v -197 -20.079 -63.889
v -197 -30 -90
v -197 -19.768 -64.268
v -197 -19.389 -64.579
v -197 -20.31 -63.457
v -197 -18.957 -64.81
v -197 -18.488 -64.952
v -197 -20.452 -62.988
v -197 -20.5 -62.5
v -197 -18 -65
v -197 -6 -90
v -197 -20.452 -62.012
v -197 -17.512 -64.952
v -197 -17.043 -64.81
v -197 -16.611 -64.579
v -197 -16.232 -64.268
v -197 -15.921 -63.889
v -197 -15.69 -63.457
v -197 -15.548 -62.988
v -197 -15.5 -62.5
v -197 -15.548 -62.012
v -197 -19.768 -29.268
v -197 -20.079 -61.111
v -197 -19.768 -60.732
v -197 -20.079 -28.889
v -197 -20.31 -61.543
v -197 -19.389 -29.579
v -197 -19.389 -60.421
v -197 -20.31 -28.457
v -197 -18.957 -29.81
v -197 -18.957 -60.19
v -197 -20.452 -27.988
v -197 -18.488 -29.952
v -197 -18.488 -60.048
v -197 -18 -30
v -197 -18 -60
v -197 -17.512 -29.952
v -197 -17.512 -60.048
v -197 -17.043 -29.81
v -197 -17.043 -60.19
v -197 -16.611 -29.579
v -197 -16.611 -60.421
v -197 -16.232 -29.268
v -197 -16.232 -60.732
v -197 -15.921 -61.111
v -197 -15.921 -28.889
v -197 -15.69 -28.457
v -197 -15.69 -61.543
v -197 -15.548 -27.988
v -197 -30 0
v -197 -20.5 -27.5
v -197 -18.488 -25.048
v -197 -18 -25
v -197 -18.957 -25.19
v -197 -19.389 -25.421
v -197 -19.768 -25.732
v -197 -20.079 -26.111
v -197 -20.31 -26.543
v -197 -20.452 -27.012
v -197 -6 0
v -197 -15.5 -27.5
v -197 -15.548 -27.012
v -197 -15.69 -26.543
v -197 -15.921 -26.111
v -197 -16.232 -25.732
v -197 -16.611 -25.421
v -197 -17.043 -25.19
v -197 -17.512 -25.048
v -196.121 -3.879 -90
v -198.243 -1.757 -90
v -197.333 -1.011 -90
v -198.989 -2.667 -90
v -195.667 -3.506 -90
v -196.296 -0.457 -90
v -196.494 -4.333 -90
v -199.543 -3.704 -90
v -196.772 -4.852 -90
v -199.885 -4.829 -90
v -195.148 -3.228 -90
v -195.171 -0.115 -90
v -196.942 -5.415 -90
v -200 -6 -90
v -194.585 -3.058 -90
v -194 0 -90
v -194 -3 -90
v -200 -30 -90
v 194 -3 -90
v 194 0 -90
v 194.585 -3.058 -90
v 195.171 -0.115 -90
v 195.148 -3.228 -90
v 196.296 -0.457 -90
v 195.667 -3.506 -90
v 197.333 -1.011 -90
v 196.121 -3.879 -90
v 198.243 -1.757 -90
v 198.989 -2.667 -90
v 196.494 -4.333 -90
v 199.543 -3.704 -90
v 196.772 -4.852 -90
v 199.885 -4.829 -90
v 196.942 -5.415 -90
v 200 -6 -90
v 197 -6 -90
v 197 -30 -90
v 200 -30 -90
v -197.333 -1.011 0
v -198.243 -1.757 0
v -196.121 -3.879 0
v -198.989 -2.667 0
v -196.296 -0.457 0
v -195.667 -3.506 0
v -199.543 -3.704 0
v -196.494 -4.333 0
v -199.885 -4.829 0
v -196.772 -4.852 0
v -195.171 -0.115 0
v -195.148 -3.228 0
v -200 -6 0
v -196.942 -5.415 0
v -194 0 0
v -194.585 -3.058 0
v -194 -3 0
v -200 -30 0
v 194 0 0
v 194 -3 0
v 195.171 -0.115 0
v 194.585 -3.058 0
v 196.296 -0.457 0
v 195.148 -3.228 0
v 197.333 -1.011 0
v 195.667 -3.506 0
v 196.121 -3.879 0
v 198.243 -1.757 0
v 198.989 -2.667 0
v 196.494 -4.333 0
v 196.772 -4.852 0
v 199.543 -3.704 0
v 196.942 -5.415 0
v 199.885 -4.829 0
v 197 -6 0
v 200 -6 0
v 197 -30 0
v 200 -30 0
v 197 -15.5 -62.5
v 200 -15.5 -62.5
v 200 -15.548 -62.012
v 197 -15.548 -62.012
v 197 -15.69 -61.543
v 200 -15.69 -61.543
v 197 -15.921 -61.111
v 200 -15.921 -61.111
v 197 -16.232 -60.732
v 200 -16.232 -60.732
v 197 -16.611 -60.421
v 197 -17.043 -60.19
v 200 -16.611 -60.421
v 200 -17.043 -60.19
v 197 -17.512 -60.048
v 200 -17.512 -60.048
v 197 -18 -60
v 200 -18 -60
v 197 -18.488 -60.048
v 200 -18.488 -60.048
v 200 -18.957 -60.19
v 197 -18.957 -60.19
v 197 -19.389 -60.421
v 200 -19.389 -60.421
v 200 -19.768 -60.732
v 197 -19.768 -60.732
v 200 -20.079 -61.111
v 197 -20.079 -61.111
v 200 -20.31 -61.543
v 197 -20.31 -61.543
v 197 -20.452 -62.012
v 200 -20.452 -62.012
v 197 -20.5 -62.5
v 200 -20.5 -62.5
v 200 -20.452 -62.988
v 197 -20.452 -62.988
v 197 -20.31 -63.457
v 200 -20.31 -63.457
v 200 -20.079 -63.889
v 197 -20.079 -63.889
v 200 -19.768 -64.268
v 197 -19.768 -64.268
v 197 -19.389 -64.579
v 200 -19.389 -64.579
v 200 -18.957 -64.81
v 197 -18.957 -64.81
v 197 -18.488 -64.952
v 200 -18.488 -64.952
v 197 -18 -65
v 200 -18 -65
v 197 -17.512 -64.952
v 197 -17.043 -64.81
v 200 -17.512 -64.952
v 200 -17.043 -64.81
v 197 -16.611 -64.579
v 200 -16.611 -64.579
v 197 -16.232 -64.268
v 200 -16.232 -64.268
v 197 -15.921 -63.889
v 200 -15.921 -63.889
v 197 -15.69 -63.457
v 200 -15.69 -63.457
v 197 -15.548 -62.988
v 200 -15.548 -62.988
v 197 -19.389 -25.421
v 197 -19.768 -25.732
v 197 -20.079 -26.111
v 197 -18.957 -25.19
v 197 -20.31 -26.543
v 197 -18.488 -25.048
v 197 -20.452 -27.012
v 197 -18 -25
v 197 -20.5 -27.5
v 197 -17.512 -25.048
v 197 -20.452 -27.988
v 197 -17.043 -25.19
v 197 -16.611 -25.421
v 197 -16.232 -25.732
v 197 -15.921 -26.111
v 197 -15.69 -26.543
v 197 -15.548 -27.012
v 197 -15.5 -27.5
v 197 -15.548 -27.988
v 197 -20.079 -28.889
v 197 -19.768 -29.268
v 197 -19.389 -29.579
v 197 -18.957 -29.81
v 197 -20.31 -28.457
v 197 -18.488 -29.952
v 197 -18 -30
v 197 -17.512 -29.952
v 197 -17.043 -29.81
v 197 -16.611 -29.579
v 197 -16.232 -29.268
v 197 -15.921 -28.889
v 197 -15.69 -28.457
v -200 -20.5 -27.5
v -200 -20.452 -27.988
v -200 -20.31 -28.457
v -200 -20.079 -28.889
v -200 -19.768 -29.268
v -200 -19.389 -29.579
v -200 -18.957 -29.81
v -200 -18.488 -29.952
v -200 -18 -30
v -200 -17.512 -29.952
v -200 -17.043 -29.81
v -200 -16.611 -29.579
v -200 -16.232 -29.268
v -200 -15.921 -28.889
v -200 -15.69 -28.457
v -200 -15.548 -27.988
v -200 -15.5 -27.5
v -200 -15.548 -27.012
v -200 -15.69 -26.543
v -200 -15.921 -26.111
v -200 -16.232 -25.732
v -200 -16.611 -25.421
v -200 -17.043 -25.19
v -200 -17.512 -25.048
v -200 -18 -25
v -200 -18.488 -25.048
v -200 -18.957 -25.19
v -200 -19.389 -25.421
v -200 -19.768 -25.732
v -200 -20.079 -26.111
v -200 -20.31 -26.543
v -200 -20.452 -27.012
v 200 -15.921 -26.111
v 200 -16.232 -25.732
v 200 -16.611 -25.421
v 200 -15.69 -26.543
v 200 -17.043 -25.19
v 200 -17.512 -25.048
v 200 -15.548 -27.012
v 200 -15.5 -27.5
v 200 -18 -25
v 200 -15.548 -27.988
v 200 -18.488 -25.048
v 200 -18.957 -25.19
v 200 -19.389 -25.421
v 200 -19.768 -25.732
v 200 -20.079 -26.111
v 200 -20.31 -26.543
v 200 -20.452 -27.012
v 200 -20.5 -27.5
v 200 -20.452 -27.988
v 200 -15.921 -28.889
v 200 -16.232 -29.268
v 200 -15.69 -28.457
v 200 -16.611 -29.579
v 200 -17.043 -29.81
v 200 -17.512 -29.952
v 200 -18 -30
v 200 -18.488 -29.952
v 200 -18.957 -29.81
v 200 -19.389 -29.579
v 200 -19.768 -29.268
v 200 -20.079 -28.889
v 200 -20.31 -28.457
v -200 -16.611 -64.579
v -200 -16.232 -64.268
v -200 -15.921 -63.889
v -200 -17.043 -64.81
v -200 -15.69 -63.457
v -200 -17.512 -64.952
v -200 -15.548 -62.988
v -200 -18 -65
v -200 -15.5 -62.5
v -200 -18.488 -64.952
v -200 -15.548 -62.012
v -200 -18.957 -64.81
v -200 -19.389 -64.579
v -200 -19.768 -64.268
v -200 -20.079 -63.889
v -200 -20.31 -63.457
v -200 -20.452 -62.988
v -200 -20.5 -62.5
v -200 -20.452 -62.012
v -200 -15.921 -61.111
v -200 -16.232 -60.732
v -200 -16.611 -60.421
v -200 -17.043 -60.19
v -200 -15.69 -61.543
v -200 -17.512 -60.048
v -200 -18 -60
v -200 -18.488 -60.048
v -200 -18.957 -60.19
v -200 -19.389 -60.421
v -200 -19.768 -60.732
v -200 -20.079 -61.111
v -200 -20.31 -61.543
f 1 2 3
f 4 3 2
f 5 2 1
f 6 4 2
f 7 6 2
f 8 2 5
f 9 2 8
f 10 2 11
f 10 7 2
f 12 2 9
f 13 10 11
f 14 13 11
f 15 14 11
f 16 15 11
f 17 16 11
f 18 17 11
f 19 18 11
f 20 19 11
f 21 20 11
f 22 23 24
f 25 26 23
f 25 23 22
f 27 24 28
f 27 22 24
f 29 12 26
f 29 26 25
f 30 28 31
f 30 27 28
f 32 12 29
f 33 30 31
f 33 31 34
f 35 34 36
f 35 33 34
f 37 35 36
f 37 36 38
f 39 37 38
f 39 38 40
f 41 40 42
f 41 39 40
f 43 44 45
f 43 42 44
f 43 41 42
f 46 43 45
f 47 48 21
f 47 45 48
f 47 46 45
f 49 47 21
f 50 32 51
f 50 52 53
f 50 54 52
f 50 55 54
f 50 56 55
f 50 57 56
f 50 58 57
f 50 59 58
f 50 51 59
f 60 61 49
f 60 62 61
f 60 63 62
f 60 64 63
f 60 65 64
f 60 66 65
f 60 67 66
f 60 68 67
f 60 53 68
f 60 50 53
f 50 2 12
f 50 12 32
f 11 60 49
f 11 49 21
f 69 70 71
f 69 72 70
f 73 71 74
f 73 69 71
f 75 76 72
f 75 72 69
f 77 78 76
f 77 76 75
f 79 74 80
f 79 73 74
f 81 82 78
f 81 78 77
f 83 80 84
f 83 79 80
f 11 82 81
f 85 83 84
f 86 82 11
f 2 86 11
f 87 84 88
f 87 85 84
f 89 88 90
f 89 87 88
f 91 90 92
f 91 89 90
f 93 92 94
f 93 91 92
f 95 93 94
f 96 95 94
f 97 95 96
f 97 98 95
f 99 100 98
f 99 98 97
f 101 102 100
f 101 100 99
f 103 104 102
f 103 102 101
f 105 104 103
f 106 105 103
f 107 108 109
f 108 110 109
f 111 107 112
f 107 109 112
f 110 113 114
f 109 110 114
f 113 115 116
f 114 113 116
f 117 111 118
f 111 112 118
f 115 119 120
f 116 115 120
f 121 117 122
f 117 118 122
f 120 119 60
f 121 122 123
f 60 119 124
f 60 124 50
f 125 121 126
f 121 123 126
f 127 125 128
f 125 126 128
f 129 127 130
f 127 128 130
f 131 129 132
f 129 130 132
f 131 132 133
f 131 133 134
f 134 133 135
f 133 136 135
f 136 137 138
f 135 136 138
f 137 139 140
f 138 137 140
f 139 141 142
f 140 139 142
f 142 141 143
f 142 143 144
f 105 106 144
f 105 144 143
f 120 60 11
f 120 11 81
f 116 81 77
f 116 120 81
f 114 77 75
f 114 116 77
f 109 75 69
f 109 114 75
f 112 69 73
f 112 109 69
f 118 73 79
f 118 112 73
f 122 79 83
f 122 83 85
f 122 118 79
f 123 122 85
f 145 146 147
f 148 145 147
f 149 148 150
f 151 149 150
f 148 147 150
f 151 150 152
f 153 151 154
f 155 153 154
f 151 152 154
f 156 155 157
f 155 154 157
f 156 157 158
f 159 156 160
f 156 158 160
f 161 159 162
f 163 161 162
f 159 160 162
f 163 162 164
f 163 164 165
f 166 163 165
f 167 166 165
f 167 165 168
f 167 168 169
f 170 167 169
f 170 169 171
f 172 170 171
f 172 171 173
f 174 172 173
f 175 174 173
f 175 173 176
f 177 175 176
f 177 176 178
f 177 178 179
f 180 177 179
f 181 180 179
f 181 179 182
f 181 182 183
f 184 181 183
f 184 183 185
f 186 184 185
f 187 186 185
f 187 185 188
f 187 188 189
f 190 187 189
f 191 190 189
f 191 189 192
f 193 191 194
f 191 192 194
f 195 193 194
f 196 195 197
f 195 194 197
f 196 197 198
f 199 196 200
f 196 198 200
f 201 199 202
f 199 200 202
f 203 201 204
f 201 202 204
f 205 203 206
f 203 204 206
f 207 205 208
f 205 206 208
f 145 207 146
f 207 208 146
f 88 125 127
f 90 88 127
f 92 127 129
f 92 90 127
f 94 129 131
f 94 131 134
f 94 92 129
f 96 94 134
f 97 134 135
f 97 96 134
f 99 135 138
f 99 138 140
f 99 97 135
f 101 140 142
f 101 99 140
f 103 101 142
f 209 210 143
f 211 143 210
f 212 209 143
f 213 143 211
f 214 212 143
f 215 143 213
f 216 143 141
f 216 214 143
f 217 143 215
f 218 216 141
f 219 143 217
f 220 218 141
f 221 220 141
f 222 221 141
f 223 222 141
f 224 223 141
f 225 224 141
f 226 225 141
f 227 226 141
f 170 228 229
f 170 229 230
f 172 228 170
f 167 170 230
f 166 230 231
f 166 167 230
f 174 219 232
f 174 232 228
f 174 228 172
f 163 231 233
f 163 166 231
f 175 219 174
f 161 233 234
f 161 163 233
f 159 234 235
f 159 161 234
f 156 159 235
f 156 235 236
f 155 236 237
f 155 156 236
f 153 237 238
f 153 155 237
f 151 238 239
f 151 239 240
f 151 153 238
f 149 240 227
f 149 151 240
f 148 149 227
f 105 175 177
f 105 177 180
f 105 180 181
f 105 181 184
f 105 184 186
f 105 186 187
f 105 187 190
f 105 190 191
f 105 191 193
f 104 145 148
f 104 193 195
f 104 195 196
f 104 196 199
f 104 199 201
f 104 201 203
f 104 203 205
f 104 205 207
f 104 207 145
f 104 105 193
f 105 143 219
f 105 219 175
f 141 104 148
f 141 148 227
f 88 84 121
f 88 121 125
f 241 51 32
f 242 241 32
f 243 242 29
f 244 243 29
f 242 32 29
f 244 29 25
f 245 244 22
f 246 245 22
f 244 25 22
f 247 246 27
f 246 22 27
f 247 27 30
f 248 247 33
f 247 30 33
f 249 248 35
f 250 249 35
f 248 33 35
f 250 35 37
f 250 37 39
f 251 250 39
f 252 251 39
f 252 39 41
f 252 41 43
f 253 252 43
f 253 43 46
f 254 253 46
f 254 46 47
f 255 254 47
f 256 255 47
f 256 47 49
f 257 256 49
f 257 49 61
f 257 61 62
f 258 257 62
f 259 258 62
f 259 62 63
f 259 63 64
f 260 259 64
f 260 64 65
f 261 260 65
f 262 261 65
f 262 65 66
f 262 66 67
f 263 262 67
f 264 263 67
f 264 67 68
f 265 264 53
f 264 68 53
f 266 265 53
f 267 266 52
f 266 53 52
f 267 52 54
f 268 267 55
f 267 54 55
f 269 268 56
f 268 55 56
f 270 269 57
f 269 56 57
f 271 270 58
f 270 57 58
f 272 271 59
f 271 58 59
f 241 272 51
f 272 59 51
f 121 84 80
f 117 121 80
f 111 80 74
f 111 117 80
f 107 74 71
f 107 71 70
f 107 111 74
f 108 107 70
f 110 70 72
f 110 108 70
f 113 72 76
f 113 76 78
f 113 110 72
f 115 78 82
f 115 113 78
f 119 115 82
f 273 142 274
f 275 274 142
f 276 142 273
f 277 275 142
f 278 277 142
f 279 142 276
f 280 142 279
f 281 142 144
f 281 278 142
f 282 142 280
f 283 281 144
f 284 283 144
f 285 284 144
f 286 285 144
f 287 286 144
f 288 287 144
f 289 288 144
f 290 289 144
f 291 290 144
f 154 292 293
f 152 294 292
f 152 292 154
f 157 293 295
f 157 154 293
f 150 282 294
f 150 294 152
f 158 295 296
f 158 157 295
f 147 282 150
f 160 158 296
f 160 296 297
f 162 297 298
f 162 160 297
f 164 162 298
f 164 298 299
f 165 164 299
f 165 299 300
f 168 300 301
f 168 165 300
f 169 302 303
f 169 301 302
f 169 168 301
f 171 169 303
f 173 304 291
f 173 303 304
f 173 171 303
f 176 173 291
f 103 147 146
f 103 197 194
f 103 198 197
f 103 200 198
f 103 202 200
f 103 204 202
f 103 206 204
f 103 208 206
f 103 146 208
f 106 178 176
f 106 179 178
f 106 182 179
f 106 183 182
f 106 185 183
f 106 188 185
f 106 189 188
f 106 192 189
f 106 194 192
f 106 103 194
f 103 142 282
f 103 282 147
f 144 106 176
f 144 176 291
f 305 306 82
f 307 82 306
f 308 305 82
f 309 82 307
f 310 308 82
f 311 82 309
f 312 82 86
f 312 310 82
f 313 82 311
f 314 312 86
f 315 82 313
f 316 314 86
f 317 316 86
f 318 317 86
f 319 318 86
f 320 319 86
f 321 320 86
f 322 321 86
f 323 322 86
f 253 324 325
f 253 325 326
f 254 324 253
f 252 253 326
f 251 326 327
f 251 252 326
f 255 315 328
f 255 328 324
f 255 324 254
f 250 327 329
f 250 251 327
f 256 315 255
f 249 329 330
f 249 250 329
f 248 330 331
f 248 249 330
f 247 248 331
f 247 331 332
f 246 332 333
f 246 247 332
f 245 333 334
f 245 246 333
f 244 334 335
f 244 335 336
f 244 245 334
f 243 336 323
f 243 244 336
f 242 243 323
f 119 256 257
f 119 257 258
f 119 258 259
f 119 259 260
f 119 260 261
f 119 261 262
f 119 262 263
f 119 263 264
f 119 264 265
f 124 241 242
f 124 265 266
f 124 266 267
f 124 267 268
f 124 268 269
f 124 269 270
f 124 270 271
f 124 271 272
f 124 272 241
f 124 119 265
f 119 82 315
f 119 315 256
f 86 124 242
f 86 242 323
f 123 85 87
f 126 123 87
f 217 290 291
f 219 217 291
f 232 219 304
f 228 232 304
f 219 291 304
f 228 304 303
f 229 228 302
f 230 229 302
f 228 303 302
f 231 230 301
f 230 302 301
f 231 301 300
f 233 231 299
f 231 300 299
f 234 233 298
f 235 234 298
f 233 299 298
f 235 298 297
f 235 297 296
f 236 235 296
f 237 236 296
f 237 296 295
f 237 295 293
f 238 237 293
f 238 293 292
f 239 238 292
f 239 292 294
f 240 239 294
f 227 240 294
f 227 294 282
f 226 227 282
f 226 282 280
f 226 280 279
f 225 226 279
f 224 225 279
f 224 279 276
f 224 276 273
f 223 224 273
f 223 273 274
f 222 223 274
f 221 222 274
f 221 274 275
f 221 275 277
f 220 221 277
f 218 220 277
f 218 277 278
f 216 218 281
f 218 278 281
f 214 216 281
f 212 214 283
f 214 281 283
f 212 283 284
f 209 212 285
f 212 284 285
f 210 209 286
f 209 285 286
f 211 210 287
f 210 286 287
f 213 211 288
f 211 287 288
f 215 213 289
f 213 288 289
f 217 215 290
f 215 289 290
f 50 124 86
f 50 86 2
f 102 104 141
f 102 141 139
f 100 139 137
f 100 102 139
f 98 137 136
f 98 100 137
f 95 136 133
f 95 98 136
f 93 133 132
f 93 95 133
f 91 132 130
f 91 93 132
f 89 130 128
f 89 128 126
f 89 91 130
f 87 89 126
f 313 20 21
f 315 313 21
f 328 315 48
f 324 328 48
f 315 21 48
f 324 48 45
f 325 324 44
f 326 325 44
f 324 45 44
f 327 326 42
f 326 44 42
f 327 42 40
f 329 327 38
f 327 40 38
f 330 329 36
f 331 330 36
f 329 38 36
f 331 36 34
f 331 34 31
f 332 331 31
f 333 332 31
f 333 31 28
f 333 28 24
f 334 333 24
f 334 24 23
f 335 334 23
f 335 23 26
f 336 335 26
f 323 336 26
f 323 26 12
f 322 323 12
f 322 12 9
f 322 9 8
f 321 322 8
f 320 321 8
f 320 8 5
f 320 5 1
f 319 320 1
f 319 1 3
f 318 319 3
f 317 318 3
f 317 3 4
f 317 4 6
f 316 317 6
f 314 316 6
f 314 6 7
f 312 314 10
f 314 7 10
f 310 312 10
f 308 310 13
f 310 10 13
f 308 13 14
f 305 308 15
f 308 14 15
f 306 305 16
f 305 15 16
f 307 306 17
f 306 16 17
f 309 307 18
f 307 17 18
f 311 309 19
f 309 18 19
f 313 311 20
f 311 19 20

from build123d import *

# Parameters (mm, degrees)
SKETCH1_W                      = 400
SKETCH1_H                      = 90
BASE_FLANGE1_DEPTH             = 3
EDGE_FLANGE1_STRIP_W           = 18
EDGE_FLANGE1_STRIP_H           = 3
EDGE_FLANGE1_STRIP_CUT_DEPTH   = 90
EDGE_FLANGE1_STRIP_2_W         = 18
EDGE_FLANGE1_STRIP_2_H         = 3
EDGE_FLANGE1_STRIP_CUT_2_DEPTH = 90
EDGE_FLANGE1_DEPTH             = 90
EDGE_FLANGE1_BEND_DEPTH        = 90
SKETCH12_R                     = 2.5
CUT_EXTRUDE1_DEPTH             = 412.096095822


# Sheet-metal steps are written as plain solids
with BuildPart() as part:
    # Sketch1 → Base-Flange1 (new body)
    with BuildSketch(Plane(origin=(0, 0, 0), x_dir=(1, 0, 0), z_dir=(0, 1, 0))):
        with Locations((0, 45)):
            Rectangle(SKETCH1_W, SKETCH1_H)
    extrude(amount=-BASE_FLANGE1_DEPTH)

    # Edge-Flange1 strip (across the edge) → Edge-Flange1 strip cut (cut)
    with BuildSketch(Plane(origin=(-200, -3, 0), x_dir=(1, 0, 0), z_dir=(0, 0, -1))):
        with Locations((-3, -1.5)):
            Rectangle(EDGE_FLANGE1_STRIP_W, EDGE_FLANGE1_STRIP_H)
    extrude(amount=EDGE_FLANGE1_STRIP_CUT_DEPTH, mode=Mode.SUBTRACT)

    # Edge-Flange1 strip 2 (across the edge) → Edge-Flange1 strip cut 2 (cut)
    with BuildSketch(Plane(origin=(200, -3, -90), x_dir=(-1, 0, 0), z_dir=(0, 0, 1))):
        with Locations((-3, -1.5)):
            Rectangle(EDGE_FLANGE1_STRIP_2_W, EDGE_FLANGE1_STRIP_2_H)
    extrude(amount=EDGE_FLANGE1_STRIP_CUT_2_DEPTH, mode=Mode.SUBTRACT)

    # Edge-Flange1 section (across the edge) → Edge-Flange1 (add)
    with BuildSketch(Plane(origin=(-200, -3, 0), x_dir=(1, 0, 0), z_dir=(0, 0, -1))):
        with BuildLine():
            Line((0, 3), (0, 27))
            Line((0, 27), (3, 27))
            Line((3, 27), (3, 3))
            ThreePointArc((3, 3), (3.878679656, 0.878679656), (6, 0))
            Line((6, 0), (6, -3))
            ThreePointArc((6, -3), (1.757359313, -1.242640687), (0, 3))
        make_face()
    extrude(amount=EDGE_FLANGE1_DEPTH)

    # Edge-Flange1 section 2 (across the edge) → Edge-Flange1 bend (add)
    with BuildSketch(Plane(origin=(200, -3, -90), x_dir=(-1, 0, 0), z_dir=(0, 0, 1))):
        with BuildLine():
            Line((0, 3), (0, 27))
            Line((0, 27), (3, 27))
            Line((3, 27), (3, 3))
            ThreePointArc((3, 3), (3.878679656, 0.878679656), (6, 0))
            Line((6, 0), (6, -3))
            ThreePointArc((6, -3), (1.757359313, -1.242640687), (0, 3))
        make_face()
    extrude(amount=EDGE_FLANGE1_BEND_DEPTH)

    # Sketch12 → Cut-Extrude1 (cut, through all)
    with BuildSketch(Plane(origin=(200, 0, 0), x_dir=(0, 0, -1), z_dir=(1, 0, 0))):
        with Locations(Location((62.5, -18, 0), (0, 0, 90))):
            Circle(SKETCH12_R)
        with Locations(Location((27.5, -18, 0), (0, 0, 270))):
            Circle(SKETCH12_R)
    extrude(amount=-CUT_EXTRUDE1_DEPTH, mode=Mode.SUBTRACT)


solid = part.part
